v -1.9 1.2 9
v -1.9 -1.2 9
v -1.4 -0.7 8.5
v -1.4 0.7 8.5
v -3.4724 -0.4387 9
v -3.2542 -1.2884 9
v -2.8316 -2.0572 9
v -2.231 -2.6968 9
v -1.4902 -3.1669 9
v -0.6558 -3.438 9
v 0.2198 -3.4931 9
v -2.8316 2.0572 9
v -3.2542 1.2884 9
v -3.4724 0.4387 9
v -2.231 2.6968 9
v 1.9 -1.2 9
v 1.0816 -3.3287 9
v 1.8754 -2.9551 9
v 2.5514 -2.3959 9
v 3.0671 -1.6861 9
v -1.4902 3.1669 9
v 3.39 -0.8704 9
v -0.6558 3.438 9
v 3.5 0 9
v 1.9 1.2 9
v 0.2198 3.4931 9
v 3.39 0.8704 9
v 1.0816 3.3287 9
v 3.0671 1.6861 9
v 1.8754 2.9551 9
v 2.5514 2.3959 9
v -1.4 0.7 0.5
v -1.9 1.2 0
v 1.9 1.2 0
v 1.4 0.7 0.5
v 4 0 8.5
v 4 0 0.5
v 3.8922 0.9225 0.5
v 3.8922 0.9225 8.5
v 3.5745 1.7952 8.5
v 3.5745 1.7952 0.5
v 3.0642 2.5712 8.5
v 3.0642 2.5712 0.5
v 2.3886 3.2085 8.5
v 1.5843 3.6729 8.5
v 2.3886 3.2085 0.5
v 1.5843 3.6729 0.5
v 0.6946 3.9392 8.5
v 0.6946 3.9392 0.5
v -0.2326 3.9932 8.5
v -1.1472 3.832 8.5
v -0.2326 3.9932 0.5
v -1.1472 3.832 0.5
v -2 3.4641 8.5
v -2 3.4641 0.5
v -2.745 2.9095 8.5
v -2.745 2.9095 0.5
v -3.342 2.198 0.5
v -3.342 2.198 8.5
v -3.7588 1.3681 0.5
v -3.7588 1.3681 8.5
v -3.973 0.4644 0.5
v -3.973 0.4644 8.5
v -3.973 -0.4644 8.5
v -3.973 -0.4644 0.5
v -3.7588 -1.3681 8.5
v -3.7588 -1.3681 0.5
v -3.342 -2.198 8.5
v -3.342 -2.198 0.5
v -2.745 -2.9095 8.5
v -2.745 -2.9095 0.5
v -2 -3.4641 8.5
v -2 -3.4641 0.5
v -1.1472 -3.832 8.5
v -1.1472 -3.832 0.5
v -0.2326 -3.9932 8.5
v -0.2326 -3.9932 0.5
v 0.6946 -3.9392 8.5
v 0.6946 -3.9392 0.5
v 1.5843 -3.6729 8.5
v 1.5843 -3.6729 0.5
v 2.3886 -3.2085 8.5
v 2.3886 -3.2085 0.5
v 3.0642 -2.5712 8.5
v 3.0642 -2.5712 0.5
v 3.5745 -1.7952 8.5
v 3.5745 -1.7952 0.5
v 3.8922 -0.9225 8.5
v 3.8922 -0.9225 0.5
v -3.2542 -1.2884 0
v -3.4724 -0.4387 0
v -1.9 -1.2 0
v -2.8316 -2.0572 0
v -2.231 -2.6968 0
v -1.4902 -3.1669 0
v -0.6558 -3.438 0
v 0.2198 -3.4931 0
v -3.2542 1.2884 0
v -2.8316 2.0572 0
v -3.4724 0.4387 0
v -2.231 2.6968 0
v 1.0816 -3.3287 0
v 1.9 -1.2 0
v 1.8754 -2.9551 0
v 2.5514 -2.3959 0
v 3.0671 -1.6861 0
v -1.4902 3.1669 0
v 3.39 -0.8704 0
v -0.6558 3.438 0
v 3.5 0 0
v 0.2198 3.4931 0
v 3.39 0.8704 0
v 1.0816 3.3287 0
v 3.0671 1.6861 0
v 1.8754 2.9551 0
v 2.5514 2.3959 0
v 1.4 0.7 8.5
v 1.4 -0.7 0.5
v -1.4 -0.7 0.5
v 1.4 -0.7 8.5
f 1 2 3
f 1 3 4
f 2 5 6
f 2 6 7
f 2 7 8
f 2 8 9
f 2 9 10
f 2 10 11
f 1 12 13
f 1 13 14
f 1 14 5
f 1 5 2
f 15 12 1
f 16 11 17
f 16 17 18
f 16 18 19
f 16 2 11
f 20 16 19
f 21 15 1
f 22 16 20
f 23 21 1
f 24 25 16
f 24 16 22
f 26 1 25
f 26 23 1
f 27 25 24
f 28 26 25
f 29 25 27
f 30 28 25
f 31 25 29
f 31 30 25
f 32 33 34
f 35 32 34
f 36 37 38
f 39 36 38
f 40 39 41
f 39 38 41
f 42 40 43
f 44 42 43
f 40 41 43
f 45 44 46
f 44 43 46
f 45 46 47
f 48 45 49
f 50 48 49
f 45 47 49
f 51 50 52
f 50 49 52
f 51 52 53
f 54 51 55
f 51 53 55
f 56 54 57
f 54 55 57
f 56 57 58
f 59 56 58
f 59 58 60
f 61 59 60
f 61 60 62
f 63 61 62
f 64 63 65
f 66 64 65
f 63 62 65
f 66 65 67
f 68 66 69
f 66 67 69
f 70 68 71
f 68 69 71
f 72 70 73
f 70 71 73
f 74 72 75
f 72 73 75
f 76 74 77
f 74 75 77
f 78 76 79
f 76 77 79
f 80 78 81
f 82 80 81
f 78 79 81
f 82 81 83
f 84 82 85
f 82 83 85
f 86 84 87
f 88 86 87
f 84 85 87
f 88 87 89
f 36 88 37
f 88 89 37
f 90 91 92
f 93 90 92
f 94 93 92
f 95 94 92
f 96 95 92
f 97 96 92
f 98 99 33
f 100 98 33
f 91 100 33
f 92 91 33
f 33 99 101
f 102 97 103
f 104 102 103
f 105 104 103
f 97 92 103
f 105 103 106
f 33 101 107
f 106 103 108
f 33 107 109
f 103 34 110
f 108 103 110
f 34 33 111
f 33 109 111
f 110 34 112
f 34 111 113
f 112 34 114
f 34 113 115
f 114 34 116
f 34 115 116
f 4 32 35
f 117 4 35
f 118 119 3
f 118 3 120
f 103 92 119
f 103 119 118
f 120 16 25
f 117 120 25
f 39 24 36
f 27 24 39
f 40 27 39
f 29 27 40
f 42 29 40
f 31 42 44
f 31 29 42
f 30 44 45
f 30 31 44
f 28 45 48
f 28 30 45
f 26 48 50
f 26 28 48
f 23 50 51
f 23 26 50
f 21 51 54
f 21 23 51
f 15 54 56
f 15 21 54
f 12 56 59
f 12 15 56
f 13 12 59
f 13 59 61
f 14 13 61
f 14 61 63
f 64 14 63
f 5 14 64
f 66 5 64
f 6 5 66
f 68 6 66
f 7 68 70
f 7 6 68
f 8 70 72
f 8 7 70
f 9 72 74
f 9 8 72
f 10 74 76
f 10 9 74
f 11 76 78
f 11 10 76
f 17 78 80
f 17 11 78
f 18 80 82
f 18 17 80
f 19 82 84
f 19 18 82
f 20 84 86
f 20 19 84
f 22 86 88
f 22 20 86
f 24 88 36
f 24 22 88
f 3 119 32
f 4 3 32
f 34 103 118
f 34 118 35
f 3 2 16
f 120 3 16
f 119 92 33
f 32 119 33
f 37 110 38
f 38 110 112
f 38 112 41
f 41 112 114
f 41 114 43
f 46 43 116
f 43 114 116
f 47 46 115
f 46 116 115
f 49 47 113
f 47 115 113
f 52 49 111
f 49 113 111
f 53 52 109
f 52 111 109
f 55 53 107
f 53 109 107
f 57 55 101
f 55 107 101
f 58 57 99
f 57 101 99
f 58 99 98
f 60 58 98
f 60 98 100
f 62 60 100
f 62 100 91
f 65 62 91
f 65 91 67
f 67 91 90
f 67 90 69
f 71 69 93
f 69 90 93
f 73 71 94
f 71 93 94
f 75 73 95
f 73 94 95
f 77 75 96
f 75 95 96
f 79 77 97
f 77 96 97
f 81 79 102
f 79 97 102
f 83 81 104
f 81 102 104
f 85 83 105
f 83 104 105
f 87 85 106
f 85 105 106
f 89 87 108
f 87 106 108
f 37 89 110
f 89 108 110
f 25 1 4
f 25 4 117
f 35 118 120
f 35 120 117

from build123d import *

# Parameters (mm, degrees)
F0_R     = 4
F0_W     = 2.8
F0_H     = 1.4
F1_DEPTH = 9
F2_SIZE  = 0.5


with BuildPart() as f1:
    # F0 (on Top) → F1 (new body)
    with BuildSketch(Plane.XY):
        Circle(F0_R)
        Rectangle(F0_W, F0_H, mode=Mode.SUBTRACT)
    extrude(amount=F1_DEPTH)

    # F2
    f2_edges = [f1.edges().sort_by_distance(p)[0] for p in [
        (-4, 0, 9),
        (-4, 0, 0),
        (1.4, 0, 0),
        (0, 0.7, 0),
        (-1.4, 0, 0),
        (0, -0.7, 0),
        (0, 0.7, 9),
        (1.4, 0, 9),
        (-1.4, 0, 9),
        (0, -0.7, 9),
    ]]
    chamfer(f2_edges, length=F2_SIZE)


solid = f1.part
